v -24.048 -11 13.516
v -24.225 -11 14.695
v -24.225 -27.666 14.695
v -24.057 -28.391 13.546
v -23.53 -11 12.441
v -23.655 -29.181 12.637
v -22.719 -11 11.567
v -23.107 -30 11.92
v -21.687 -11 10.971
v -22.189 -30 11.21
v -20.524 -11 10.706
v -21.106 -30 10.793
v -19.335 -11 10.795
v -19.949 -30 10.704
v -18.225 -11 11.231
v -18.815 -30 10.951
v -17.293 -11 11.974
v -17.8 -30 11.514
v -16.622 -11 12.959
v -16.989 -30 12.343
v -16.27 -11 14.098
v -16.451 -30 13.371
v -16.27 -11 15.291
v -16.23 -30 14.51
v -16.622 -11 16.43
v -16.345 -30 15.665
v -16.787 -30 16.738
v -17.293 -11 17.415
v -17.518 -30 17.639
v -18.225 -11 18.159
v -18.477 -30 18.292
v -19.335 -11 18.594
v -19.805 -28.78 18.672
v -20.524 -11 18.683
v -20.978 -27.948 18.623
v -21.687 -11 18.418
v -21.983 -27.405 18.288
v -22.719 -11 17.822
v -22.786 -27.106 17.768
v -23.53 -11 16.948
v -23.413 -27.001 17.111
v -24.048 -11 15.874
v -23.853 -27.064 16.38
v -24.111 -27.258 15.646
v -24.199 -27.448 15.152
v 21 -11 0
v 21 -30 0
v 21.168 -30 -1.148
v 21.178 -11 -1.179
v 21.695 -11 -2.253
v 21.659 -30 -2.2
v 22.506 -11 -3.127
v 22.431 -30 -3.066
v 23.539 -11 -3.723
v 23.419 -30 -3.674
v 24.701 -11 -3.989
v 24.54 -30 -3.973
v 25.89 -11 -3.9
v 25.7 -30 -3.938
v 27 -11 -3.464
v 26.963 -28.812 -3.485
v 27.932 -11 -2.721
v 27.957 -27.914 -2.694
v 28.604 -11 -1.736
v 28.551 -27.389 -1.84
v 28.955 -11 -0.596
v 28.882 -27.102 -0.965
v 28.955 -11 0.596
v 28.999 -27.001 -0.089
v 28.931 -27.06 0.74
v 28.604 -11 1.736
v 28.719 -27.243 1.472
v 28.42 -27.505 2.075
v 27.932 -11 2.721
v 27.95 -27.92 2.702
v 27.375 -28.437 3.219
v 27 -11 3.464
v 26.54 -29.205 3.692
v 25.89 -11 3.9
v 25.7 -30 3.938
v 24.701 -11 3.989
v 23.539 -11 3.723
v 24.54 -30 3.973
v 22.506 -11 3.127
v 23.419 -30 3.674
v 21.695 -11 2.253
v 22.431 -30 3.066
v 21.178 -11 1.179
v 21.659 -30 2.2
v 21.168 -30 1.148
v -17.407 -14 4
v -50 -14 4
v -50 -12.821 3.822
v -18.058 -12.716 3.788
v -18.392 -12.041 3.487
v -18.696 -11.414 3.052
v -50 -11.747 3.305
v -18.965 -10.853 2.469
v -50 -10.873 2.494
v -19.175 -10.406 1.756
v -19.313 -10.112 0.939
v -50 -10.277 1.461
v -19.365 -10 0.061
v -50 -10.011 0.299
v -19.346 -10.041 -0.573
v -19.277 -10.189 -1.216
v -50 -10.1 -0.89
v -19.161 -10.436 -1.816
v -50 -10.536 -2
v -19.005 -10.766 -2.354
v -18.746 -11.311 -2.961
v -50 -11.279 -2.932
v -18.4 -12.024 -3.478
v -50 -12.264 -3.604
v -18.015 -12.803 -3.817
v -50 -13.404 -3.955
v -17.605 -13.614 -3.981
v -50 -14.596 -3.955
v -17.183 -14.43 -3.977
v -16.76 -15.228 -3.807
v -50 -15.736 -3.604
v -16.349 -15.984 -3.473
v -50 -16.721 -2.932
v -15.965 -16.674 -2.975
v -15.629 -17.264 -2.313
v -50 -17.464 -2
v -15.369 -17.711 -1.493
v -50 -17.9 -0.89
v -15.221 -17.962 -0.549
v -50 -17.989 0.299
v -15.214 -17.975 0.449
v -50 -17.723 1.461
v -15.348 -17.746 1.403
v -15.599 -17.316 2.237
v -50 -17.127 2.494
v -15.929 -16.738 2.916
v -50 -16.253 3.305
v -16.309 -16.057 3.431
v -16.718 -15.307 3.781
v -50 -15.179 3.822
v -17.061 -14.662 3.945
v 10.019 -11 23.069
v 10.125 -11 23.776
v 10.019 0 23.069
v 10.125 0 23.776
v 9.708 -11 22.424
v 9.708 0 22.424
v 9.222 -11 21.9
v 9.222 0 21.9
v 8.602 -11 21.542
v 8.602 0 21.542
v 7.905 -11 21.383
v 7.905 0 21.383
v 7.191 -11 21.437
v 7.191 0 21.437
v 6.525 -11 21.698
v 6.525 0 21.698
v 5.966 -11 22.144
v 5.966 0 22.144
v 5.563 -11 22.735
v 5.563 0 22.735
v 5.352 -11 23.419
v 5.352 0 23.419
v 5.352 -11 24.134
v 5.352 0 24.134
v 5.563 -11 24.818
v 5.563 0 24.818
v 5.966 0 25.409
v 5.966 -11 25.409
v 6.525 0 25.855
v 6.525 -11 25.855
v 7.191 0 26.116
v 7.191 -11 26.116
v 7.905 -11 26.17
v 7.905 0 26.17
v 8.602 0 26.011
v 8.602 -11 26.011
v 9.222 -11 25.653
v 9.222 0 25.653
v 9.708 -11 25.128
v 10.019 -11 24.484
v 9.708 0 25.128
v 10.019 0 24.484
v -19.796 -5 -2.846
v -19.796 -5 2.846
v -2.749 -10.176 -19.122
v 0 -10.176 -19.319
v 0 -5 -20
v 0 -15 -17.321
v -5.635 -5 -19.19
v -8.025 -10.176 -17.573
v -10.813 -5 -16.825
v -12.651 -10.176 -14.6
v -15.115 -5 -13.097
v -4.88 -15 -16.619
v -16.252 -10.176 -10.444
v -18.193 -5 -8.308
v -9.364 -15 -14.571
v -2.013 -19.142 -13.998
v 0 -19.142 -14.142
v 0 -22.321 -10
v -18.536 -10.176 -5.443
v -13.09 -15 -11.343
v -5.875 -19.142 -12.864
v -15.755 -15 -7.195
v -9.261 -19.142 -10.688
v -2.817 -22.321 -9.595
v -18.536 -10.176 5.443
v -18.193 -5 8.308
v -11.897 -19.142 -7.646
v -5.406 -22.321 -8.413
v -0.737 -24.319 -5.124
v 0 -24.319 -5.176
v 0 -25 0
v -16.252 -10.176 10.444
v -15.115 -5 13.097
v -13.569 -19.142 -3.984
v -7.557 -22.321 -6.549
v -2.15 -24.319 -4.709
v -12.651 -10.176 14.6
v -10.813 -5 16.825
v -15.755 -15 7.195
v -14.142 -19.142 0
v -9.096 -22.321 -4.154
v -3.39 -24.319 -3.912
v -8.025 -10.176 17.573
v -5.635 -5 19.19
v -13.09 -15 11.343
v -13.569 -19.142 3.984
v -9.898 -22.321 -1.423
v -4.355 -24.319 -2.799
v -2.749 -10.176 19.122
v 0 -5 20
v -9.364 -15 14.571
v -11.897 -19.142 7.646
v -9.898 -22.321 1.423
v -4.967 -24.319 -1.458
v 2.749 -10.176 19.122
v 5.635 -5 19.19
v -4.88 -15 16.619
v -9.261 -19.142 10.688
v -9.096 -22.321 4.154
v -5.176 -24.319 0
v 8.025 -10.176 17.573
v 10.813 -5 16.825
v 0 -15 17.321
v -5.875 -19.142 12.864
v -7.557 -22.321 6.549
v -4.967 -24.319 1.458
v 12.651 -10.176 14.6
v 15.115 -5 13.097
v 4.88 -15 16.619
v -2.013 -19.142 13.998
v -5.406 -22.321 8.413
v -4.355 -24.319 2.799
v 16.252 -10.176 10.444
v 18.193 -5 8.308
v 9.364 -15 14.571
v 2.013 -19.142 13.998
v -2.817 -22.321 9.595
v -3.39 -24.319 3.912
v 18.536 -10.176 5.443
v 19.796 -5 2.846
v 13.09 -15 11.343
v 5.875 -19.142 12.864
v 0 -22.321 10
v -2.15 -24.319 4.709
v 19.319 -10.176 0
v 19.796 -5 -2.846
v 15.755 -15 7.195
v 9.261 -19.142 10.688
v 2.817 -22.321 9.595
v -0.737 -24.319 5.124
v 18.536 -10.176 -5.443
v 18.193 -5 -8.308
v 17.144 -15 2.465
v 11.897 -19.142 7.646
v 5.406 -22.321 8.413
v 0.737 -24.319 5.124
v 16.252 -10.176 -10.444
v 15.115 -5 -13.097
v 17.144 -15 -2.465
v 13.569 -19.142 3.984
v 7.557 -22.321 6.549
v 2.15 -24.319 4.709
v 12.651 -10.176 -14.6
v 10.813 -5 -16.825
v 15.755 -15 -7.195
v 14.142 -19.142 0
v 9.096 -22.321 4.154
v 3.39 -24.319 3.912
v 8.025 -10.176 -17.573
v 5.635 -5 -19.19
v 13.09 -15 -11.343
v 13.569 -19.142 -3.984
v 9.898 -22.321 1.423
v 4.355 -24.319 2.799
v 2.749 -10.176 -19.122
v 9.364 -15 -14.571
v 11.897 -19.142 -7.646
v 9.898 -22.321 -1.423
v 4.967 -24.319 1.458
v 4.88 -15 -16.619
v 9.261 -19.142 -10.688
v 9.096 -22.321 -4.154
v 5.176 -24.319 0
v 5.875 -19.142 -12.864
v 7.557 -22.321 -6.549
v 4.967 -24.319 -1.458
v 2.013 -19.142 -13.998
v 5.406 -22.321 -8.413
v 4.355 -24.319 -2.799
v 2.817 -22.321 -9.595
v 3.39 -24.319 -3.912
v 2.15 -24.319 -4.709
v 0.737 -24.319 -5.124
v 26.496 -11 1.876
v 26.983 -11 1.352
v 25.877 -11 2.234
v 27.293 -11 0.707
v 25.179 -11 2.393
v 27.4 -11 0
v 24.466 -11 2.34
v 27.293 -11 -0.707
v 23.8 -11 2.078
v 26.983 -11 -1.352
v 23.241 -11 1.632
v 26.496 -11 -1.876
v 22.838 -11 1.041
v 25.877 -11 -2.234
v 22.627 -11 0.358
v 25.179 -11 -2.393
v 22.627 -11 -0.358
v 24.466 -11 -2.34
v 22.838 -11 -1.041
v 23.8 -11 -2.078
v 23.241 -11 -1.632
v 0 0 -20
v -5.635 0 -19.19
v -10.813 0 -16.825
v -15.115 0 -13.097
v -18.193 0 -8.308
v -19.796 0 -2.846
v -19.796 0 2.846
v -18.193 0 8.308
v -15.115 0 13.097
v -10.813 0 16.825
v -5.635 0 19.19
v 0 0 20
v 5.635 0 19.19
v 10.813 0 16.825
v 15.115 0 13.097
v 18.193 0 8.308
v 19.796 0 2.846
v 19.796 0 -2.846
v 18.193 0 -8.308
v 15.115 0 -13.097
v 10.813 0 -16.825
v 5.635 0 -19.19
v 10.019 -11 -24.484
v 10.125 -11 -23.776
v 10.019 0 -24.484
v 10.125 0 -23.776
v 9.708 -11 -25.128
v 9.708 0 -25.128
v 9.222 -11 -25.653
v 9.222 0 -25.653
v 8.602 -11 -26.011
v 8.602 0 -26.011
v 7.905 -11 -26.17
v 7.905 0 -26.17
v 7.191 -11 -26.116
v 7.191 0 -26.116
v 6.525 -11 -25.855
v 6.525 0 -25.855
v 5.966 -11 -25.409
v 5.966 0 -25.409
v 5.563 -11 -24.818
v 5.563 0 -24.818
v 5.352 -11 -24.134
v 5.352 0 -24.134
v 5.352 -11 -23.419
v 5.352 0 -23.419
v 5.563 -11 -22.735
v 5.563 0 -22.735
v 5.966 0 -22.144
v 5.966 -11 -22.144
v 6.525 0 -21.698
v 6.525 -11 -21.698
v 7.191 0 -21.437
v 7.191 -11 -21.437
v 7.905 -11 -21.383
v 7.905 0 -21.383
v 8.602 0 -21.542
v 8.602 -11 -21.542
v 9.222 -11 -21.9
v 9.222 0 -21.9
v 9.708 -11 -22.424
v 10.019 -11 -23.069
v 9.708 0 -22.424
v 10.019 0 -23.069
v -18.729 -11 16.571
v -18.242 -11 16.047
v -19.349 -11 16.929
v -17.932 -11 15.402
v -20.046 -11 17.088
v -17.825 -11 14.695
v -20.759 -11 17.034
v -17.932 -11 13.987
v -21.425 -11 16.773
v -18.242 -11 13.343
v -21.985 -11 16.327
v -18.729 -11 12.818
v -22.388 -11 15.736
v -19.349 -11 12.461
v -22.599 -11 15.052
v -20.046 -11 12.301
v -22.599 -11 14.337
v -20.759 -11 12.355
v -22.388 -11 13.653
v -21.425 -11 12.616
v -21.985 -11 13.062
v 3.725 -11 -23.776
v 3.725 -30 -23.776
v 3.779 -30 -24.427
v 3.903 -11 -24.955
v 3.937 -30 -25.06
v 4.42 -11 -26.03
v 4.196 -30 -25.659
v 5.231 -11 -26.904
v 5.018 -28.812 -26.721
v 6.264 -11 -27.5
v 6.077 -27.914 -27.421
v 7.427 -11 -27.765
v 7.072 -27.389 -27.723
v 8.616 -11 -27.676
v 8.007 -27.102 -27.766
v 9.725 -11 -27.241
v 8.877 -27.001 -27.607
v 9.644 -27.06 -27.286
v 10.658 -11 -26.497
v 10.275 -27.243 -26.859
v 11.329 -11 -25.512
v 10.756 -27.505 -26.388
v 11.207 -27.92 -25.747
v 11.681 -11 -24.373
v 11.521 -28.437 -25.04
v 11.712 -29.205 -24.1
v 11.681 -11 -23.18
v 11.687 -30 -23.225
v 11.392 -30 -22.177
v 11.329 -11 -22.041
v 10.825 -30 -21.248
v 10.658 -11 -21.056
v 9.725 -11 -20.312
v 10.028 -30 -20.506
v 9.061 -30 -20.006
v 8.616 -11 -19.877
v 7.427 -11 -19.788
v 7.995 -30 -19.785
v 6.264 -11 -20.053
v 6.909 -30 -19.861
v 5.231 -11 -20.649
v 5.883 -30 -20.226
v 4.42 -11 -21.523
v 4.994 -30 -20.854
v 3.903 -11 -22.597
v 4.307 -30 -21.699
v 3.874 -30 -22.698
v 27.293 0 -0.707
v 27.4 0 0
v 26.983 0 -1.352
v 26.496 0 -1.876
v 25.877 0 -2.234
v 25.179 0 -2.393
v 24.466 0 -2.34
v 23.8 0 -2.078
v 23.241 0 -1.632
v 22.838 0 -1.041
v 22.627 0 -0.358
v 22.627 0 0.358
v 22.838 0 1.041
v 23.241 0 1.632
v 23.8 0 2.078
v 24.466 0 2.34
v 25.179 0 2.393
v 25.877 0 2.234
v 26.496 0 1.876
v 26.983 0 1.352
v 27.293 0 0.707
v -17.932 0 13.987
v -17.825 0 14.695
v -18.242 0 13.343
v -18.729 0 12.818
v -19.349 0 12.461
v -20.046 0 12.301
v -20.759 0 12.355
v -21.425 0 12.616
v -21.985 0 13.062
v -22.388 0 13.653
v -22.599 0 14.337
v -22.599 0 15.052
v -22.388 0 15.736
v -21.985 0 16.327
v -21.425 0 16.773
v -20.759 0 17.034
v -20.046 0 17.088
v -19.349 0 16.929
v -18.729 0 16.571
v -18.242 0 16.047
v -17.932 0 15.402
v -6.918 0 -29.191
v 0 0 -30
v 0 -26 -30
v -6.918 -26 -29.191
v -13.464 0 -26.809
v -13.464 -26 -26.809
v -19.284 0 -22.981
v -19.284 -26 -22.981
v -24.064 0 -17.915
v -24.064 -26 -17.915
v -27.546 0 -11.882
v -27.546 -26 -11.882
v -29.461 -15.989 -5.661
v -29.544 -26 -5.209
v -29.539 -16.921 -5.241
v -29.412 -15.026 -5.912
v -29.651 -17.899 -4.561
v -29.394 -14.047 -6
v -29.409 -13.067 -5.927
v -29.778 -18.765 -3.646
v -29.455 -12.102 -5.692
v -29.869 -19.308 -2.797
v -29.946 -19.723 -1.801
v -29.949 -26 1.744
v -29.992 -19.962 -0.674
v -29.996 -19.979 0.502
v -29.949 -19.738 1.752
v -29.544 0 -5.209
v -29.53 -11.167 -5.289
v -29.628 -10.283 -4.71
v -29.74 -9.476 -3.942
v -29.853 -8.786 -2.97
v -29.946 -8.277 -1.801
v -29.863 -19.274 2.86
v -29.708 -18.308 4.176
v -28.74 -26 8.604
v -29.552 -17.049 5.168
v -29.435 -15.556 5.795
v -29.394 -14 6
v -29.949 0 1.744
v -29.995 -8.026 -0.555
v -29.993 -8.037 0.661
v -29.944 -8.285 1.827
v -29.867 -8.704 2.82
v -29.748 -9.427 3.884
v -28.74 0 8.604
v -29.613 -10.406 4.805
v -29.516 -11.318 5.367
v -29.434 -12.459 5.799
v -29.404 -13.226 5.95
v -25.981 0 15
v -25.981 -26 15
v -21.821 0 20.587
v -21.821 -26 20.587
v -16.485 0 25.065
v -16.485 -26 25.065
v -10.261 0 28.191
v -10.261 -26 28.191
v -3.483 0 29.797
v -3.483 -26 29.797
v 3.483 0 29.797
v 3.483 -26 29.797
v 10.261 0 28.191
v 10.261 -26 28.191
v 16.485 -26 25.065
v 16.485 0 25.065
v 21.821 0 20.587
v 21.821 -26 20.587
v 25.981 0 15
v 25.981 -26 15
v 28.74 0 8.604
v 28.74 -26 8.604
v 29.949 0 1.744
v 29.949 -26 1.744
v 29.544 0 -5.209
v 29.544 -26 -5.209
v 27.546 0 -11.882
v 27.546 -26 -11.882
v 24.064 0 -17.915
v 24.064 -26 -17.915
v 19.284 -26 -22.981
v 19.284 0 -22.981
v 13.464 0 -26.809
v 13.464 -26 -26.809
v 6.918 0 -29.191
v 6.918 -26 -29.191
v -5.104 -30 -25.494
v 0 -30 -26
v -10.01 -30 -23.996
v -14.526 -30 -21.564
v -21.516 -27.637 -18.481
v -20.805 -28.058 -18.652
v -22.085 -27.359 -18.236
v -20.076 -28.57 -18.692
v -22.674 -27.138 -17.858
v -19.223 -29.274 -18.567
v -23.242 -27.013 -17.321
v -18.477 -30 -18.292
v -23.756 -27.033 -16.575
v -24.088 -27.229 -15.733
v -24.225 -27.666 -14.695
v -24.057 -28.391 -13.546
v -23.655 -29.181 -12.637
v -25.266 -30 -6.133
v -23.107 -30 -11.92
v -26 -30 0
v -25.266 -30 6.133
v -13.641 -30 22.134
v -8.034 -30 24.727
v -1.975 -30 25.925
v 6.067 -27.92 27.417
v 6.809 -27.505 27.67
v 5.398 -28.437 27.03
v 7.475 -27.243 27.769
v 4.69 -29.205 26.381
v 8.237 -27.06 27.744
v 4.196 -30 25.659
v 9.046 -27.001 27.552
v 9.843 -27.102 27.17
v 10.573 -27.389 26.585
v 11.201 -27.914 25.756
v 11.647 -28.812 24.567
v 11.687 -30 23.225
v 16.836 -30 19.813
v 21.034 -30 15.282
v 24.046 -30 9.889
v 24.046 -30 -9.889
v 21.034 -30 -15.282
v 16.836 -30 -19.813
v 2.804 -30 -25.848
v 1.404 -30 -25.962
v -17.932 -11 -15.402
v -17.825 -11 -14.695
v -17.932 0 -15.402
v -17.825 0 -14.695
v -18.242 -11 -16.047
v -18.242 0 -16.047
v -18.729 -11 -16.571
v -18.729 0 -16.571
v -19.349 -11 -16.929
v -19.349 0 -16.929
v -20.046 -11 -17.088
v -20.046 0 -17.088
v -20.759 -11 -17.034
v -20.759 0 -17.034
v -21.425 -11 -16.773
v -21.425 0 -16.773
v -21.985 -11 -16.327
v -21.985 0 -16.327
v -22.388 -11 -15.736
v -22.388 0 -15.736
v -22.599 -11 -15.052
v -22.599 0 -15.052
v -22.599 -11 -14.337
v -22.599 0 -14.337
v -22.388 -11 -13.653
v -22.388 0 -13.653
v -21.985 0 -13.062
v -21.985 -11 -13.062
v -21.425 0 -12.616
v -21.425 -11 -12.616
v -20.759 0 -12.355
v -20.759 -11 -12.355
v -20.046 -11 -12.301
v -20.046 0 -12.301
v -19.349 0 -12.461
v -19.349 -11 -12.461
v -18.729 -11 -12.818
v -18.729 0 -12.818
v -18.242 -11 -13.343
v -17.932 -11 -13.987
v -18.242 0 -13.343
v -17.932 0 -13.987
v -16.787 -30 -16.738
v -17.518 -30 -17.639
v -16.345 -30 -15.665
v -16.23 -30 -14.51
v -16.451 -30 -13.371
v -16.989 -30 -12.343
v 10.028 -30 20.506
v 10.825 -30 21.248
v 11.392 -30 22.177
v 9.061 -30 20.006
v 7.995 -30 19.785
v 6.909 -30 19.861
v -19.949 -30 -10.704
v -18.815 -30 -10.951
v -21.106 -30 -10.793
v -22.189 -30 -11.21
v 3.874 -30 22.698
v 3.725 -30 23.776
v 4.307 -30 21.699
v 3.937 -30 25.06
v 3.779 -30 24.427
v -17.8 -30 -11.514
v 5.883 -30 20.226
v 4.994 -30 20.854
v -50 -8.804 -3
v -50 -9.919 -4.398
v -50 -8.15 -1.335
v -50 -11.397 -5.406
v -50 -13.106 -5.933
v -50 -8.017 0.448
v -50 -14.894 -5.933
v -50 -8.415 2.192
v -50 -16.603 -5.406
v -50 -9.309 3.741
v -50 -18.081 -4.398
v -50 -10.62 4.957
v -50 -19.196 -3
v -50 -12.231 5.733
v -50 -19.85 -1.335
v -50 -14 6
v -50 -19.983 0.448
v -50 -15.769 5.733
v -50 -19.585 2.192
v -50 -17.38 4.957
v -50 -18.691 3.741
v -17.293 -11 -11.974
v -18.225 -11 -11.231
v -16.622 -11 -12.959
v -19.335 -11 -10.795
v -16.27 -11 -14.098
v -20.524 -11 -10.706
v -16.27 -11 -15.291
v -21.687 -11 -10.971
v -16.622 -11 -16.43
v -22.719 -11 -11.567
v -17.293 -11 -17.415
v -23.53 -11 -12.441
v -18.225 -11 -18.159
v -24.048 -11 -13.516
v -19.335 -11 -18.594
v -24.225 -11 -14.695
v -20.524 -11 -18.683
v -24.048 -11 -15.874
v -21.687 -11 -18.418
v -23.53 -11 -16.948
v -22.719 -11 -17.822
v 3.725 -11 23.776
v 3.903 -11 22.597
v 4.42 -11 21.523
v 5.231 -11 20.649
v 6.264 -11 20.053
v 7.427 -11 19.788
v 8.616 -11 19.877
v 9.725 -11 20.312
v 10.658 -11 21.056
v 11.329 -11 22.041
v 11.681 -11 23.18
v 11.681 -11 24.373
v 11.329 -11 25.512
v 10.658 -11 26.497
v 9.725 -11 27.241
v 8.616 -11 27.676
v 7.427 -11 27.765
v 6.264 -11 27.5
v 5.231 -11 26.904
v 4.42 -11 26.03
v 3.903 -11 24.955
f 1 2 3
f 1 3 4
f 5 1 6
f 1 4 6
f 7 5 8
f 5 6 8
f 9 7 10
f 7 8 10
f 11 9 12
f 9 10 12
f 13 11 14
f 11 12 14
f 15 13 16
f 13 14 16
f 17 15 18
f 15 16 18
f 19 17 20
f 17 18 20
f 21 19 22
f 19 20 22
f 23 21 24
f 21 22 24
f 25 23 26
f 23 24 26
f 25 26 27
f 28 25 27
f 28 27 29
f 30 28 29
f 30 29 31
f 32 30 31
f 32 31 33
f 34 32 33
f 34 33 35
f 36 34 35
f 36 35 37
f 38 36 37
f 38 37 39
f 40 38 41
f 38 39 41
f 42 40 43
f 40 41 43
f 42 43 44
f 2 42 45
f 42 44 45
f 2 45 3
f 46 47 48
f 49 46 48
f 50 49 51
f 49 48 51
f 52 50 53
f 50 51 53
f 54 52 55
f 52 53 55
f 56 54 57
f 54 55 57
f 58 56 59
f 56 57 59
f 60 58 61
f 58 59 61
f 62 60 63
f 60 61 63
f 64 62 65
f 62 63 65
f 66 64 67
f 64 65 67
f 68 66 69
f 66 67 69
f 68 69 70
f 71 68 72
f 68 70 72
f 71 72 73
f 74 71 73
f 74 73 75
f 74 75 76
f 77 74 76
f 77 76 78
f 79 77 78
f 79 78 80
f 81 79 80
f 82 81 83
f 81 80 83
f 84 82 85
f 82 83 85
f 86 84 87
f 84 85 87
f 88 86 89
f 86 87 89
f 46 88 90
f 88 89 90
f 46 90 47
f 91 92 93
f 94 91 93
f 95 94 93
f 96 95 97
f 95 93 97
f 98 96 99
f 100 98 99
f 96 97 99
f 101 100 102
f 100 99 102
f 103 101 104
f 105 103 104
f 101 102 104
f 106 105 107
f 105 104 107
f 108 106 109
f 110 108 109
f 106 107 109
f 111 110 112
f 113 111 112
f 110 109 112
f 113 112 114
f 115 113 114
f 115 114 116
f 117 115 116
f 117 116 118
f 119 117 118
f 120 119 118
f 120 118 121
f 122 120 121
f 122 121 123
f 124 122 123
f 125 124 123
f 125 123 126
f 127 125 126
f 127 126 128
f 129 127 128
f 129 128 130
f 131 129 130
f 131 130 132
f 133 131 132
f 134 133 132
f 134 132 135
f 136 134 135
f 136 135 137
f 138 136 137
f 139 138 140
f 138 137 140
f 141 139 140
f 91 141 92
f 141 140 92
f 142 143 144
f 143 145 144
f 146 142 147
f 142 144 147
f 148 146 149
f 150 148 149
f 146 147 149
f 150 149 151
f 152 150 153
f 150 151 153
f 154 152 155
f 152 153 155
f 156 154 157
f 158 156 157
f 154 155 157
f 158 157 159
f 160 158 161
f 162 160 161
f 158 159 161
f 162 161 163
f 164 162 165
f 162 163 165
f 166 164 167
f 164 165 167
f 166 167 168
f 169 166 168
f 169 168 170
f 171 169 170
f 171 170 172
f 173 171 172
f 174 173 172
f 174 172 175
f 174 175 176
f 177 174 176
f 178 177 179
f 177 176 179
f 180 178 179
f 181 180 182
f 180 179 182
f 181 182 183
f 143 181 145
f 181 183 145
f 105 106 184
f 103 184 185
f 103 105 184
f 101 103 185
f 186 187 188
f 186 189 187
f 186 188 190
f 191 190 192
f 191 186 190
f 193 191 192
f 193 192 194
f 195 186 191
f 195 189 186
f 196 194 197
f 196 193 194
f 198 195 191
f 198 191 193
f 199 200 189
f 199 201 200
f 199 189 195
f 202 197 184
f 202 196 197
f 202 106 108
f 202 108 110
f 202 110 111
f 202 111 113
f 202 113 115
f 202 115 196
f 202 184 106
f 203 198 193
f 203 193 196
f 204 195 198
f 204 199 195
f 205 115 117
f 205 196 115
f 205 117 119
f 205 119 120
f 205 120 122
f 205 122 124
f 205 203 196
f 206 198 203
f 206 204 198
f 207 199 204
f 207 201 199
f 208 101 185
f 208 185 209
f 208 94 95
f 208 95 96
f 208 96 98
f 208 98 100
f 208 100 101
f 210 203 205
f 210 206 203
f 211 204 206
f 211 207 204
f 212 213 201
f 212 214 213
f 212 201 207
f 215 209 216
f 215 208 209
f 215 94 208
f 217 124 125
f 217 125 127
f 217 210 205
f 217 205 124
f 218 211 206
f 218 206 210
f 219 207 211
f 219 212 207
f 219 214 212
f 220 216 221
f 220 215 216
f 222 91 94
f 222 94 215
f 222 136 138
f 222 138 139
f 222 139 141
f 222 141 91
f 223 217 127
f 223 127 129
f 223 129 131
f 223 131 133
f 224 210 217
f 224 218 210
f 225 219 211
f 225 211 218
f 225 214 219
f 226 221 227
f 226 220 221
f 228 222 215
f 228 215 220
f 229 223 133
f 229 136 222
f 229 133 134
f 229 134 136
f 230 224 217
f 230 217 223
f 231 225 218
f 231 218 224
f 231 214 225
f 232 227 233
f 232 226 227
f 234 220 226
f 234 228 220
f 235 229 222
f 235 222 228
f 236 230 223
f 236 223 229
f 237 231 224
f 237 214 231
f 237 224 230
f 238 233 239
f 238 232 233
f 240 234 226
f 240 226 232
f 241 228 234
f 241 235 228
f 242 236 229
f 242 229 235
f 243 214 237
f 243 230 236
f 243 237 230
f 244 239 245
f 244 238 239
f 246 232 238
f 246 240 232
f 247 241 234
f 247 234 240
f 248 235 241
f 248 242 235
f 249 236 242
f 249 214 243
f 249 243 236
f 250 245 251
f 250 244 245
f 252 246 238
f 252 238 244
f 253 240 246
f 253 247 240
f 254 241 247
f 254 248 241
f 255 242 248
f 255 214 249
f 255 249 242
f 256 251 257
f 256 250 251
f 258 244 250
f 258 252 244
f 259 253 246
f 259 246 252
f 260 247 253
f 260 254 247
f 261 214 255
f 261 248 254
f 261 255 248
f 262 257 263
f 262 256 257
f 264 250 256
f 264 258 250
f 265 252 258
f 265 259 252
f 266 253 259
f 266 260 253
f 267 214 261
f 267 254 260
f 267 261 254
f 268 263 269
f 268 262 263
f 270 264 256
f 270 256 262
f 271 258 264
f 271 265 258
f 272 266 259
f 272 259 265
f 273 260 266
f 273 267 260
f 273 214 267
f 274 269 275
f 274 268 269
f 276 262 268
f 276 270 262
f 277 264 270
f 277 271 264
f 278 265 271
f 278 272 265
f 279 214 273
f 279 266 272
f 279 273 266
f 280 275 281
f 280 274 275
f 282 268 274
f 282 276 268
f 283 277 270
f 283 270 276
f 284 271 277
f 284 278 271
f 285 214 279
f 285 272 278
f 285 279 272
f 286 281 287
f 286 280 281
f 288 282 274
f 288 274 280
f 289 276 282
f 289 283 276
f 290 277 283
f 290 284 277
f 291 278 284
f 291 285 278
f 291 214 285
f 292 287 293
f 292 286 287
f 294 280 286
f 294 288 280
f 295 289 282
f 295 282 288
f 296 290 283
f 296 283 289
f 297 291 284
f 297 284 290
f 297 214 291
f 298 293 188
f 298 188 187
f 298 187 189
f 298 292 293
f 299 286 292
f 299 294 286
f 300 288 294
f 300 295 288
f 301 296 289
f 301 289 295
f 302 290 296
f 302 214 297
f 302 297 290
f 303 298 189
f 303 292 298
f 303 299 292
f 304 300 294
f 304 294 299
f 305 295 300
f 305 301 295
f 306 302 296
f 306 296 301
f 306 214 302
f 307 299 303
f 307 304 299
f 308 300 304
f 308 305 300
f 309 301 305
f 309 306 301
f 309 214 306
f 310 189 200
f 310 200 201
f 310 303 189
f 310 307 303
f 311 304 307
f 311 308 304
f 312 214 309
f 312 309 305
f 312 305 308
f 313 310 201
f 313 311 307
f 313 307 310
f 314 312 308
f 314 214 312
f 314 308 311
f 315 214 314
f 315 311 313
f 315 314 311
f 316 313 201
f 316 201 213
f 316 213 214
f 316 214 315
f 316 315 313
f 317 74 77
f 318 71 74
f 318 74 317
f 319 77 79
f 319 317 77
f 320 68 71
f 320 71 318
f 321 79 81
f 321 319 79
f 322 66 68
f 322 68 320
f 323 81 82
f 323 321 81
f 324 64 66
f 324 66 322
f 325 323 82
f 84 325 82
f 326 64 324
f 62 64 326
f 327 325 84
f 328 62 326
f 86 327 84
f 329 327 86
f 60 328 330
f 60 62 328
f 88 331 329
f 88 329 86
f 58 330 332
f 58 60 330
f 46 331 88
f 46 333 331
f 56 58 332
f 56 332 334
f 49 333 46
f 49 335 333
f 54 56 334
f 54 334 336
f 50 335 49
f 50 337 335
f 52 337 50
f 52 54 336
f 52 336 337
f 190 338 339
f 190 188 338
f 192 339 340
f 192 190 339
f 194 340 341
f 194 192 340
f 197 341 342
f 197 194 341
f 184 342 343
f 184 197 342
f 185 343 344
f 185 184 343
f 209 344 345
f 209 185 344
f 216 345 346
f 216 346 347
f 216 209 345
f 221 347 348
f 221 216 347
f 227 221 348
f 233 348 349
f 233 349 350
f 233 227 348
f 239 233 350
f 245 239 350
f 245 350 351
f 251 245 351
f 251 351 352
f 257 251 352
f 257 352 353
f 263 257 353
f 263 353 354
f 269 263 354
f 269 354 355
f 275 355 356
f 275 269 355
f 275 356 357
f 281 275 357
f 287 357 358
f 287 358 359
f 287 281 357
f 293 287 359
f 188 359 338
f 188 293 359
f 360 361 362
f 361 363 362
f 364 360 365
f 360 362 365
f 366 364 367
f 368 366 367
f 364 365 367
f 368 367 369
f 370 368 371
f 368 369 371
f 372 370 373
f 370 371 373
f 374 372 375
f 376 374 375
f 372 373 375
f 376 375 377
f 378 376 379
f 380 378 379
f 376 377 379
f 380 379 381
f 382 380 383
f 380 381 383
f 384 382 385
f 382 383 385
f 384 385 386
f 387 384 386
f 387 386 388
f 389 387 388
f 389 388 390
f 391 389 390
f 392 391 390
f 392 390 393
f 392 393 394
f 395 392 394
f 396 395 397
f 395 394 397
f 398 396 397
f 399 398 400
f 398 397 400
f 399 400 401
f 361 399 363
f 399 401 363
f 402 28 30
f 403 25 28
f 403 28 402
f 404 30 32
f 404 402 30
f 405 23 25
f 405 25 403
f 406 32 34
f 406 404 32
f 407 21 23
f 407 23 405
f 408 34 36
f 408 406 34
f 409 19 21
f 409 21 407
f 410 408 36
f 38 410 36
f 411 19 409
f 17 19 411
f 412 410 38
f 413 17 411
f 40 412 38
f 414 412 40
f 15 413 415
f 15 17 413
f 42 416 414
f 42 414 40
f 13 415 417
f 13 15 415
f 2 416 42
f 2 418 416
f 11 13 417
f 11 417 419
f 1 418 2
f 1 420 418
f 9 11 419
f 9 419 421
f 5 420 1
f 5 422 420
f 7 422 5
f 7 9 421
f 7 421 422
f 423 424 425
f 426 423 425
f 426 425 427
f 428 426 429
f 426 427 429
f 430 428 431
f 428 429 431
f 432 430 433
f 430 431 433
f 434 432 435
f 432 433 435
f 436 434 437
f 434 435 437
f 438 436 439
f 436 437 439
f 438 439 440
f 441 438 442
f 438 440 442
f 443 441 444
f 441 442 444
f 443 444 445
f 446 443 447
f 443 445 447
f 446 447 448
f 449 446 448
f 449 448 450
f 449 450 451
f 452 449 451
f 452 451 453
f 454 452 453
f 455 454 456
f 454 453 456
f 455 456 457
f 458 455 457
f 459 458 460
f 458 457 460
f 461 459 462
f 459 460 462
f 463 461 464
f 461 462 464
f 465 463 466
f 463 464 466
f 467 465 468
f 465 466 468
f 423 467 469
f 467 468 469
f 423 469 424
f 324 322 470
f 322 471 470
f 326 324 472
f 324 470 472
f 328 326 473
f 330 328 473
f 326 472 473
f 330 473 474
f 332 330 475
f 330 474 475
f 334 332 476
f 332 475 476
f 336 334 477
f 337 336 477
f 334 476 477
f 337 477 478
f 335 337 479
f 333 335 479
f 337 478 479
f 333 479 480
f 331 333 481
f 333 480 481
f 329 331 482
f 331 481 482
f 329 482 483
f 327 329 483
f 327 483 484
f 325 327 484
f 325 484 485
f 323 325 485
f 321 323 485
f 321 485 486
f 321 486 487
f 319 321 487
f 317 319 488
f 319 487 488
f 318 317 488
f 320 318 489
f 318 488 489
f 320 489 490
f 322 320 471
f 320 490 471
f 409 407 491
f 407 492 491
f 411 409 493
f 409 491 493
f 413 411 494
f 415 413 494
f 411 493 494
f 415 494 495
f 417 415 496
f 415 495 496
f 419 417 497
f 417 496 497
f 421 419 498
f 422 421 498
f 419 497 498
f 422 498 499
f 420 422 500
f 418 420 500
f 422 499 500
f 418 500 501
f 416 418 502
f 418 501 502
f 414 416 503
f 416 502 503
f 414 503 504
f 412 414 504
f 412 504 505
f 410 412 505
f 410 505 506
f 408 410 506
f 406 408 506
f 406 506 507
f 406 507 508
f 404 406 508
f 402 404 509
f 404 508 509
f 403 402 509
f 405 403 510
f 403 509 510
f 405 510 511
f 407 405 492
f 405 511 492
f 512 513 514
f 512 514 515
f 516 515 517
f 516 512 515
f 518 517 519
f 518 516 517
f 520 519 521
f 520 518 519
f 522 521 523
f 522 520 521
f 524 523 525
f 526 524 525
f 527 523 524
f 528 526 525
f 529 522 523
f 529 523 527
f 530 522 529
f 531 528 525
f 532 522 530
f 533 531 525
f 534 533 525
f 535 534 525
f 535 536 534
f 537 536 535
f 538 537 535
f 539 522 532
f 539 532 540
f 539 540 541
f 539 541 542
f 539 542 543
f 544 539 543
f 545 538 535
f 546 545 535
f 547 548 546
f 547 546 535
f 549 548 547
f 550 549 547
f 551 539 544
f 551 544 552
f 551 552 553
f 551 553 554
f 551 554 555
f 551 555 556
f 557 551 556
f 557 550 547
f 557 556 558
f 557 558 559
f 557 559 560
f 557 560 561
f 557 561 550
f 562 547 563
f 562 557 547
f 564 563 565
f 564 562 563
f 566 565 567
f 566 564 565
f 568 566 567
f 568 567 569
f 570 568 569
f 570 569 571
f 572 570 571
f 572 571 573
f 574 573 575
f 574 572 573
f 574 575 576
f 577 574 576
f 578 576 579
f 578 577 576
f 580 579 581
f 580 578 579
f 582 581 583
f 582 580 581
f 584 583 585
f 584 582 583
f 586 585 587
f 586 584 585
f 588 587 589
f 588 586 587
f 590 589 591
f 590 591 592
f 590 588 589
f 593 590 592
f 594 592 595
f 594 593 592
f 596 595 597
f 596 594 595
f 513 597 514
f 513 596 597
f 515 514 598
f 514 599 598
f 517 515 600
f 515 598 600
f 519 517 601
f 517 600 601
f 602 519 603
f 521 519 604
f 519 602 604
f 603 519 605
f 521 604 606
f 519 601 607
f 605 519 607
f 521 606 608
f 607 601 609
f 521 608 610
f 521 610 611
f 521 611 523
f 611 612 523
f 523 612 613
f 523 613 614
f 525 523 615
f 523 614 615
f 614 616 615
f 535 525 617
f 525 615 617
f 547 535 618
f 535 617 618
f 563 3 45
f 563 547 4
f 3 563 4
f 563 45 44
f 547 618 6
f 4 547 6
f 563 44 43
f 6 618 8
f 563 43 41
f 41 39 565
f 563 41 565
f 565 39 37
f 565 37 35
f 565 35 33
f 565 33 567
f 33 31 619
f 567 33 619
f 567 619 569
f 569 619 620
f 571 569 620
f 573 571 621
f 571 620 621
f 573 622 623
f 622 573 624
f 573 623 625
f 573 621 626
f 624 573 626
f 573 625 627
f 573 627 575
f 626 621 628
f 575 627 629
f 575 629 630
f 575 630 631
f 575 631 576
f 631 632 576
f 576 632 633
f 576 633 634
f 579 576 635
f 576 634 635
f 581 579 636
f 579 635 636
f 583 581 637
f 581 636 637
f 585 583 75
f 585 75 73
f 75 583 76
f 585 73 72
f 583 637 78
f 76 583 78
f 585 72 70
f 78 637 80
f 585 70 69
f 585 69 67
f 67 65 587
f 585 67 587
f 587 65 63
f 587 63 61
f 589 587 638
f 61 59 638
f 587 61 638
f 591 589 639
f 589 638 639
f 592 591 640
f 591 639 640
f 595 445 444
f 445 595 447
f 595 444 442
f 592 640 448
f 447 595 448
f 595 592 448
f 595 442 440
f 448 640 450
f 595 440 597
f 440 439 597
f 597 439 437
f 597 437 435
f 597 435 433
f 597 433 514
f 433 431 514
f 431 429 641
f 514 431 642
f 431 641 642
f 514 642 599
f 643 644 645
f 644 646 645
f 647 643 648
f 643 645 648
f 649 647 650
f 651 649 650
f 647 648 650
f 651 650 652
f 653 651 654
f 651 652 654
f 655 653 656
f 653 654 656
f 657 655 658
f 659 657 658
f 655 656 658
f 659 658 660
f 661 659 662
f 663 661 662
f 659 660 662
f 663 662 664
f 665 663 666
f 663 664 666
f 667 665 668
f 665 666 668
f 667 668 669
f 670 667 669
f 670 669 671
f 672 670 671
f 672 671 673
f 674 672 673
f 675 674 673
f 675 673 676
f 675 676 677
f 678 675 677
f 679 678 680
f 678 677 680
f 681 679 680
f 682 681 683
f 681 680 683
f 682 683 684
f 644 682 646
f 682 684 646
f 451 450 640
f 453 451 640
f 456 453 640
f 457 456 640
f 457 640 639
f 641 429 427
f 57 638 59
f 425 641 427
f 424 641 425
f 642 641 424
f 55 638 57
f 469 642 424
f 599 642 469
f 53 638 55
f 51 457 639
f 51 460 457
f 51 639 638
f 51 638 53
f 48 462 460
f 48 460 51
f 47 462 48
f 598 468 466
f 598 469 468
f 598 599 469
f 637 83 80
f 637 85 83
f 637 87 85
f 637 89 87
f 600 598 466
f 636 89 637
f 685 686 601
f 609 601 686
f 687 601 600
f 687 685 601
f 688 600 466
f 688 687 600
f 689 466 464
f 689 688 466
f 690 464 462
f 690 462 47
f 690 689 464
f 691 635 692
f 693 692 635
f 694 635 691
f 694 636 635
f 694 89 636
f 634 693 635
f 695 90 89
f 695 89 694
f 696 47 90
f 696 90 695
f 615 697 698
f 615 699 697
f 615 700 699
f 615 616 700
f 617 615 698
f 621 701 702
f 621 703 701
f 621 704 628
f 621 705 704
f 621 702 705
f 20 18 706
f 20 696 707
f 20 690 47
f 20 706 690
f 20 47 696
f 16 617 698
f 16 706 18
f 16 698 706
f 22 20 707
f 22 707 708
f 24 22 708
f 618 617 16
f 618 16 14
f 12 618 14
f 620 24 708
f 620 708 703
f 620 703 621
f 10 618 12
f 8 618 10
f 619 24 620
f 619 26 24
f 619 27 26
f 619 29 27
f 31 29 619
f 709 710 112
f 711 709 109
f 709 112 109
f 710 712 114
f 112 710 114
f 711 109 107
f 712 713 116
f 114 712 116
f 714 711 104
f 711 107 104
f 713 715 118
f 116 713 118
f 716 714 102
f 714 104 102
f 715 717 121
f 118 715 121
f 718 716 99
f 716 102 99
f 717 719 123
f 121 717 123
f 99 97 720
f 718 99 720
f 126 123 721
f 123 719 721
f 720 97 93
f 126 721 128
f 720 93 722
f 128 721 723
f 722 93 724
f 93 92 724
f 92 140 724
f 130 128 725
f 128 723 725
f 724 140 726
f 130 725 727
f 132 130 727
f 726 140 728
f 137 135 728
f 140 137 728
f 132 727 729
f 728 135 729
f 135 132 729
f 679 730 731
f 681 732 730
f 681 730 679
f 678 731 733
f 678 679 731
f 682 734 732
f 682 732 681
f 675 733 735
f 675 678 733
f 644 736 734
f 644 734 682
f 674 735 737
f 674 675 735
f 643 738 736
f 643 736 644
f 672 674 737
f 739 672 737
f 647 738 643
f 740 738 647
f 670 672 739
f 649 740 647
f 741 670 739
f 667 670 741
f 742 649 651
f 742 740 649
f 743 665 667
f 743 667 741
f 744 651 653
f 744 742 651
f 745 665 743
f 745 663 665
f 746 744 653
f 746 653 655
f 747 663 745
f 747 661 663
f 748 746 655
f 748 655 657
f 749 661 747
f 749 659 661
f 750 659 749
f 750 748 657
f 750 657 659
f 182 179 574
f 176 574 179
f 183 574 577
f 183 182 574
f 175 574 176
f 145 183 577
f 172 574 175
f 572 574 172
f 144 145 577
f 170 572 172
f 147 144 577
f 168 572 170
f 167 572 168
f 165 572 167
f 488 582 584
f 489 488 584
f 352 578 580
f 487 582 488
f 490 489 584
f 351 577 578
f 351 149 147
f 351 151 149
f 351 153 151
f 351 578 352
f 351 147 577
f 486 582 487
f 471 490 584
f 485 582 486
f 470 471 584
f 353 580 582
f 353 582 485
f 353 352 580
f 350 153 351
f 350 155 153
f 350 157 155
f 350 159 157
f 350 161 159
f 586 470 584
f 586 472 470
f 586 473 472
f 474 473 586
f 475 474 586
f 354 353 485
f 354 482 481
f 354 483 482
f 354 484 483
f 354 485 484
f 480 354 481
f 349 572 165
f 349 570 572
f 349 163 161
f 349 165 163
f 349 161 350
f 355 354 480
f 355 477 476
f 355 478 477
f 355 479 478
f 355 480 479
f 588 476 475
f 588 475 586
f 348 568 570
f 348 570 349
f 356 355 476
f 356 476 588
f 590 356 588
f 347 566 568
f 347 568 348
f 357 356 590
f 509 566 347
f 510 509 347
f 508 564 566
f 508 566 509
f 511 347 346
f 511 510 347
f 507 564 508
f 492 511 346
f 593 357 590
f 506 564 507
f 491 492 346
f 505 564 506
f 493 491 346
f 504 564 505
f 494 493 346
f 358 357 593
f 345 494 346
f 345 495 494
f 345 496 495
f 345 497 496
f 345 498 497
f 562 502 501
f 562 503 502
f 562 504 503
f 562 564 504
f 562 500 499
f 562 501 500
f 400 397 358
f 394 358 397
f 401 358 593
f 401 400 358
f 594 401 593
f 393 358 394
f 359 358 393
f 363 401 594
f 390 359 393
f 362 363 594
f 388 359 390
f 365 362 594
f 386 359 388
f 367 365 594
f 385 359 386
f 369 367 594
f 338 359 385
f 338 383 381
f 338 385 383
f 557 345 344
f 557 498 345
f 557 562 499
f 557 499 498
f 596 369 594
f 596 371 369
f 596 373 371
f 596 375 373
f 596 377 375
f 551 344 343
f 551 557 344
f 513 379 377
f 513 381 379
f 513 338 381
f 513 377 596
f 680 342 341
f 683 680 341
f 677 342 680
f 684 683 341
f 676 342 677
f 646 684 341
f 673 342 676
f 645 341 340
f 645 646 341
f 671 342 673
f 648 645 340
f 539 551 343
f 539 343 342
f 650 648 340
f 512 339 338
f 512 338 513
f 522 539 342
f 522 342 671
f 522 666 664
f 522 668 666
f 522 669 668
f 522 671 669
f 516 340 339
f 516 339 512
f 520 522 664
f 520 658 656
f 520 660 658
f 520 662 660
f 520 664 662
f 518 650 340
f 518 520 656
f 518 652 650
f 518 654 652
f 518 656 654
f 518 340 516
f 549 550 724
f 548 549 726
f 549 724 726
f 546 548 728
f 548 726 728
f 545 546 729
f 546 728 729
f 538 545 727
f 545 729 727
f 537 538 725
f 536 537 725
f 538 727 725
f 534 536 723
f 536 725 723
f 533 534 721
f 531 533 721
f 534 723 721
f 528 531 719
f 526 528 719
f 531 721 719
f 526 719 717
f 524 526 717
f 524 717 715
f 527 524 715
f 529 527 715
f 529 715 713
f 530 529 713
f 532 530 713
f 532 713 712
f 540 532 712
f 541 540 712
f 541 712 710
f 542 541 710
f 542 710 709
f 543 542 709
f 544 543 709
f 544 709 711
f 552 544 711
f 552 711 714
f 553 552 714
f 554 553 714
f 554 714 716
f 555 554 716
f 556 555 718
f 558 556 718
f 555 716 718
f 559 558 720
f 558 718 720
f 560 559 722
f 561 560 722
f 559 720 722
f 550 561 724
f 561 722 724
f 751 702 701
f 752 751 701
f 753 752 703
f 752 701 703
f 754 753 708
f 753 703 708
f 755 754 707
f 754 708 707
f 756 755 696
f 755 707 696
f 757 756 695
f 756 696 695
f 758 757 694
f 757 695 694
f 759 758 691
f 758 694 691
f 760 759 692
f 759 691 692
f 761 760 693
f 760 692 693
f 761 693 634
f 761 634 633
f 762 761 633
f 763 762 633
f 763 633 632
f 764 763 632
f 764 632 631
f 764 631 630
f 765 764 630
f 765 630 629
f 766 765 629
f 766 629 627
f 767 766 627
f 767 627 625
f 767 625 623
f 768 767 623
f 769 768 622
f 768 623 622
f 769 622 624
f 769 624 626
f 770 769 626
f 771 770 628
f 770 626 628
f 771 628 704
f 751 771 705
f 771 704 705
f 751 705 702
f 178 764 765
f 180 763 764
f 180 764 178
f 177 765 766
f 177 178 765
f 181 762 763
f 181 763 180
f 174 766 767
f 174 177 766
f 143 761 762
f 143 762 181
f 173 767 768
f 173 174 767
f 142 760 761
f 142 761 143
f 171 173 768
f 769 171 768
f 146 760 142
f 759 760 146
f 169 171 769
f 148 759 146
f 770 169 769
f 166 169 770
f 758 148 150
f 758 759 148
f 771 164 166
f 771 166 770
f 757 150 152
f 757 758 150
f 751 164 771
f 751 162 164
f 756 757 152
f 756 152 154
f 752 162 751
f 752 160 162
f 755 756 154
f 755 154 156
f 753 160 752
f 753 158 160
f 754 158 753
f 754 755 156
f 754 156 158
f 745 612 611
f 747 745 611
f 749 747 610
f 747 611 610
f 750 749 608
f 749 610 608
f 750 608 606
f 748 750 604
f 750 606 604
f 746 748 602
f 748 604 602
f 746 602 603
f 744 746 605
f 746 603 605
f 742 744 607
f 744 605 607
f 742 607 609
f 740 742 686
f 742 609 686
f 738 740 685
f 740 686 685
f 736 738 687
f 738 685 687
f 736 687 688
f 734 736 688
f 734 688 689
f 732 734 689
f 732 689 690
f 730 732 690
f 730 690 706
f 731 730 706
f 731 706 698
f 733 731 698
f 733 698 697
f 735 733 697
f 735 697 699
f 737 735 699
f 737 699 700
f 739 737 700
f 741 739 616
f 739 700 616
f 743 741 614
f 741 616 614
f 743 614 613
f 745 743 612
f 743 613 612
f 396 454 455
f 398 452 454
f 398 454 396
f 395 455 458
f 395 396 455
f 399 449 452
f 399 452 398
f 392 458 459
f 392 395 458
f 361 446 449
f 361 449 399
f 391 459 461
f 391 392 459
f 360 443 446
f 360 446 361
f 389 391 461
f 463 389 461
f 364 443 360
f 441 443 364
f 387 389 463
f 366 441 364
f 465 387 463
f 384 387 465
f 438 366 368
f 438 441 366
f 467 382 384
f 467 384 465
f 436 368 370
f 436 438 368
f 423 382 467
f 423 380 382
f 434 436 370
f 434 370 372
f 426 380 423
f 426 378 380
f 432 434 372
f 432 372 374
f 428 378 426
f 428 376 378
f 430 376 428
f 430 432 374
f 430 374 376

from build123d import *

# Parameters (mm, degrees)
BOSS_EXTRUDE1_REACH            = 92.554
BOSS_EXTRUDE1_END_RADIUS       = 30
SKETCH2_R                      = 6
CUT_EXTRUDE1_REACH             = 92.554
CUT_EXTRUDE1_END_RADIUS        = 20
SKETCH4_R                      = 4
CHAMFER1_SIZE                  = 4
CBORE_FOR_M4_SHCS1_D           = 4.8
CBORE_FOR_M4_SHCS1_CBORE_D     = 8
CBORE_FOR_M4_SHCS1_CBORE_DEPTH = 19


with BuildPart() as part:
    # Sketch1 → Revolve1 (revolve)
    with BuildSketch(Plane.XY, mode=Mode.PRIVATE) as revolve1_sk:
        with BuildLine():
            Line((20, 0), (20, -5))
            ThreePointArc((20, -5), (14.142135624, -19.142135624), (0, -25))
            Line((0, -25), (0, -30))
            Line((0, -30), (30, -30))
            Line((30, -30), (30, 0))
            Line((30, 0), (20, 0))
        make_face()
    revolve(revolve1_sk.sketch.rotate(Axis((0, 18.533057851, 0), (0, 1, 0)), 90), axis=Axis((0, 18.533057851, 0), (0, 1, 0)))

    # Boss-Extrude1: up to this cylinder (the profile starts outside it)
    boss_extrude1_end = Plane(origin=(0, -14, 0), z_dir=(0, -1, 0)) * Cylinder(BOSS_EXTRUDE1_END_RADIUS, 246.108, mode=Mode.PRIVATE)
    # Sketch2 → Boss-Extrude1 (add, up to the surface)
    with BuildSketch(Plane(origin=(-50, 0, 0), x_dir=(0, 0, -1), z_dir=(1, 0, 0)), mode=Mode.PRIVATE) as boss_extrude1_sk1:
        with Locations(Location((0, -14, 0), (0, 0, 180))):
            Circle(SKETCH2_R)
    boss_extrude1_tool1 = extrude(boss_extrude1_sk1.sketch, amount=BOSS_EXTRUDE1_REACH, mode=Mode.PRIVATE) - boss_extrude1_end
    add(boss_extrude1_tool1.solids().sort_by_distance((-50, -14, 0))[0])

    # Cut-Extrude1: up to this sphere (the profile starts outside it)
    cut_extrude1_end = Location((0, -5, 0)) * Sphere(CUT_EXTRUDE1_END_RADIUS, mode=Mode.PRIVATE)
    # Sketch4 → Cut-Extrude1 (cut, up to the surface)
    with BuildSketch(Plane.ZY.offset(50), mode=Mode.PRIVATE) as cut_extrude1_sk1:
        with Locations((0, -14)):
            Circle(SKETCH4_R)
    cut_extrude1_tool1 = extrude(cut_extrude1_sk1.sketch, amount=-CUT_EXTRUDE1_REACH, mode=Mode.PRIVATE) - cut_extrude1_end
    add(cut_extrude1_tool1.solids().sort_by_distance((-50, -14, 0))[0], mode=Mode.SUBTRACT)

    # Chamfer1
    chamfer1_edges = [part.edges().sort_by_distance(p)[0] for p in [
        (0, -30, 30),
    ]]
    chamfer(chamfer1_edges, length=CHAMFER1_SIZE)

    # CBORE for M4 SHCS1 (through all)
    with Locations(Plane(origin=(0, -30, 0), x_dir=(-1, 0, 0), z_dir=(0, -1, 0))):
        with Locations((-25, 0), (-7.725424859, -23.776412907), (20.225424859, -14.694631307), (20.225424859, 14.694631307), (-7.725424859, 23.776412907)):
            CounterBoreHole(CBORE_FOR_M4_SHCS1_D / 2, CBORE_FOR_M4_SHCS1_CBORE_D / 2, CBORE_FOR_M4_SHCS1_CBORE_DEPTH)


solid = part.part
